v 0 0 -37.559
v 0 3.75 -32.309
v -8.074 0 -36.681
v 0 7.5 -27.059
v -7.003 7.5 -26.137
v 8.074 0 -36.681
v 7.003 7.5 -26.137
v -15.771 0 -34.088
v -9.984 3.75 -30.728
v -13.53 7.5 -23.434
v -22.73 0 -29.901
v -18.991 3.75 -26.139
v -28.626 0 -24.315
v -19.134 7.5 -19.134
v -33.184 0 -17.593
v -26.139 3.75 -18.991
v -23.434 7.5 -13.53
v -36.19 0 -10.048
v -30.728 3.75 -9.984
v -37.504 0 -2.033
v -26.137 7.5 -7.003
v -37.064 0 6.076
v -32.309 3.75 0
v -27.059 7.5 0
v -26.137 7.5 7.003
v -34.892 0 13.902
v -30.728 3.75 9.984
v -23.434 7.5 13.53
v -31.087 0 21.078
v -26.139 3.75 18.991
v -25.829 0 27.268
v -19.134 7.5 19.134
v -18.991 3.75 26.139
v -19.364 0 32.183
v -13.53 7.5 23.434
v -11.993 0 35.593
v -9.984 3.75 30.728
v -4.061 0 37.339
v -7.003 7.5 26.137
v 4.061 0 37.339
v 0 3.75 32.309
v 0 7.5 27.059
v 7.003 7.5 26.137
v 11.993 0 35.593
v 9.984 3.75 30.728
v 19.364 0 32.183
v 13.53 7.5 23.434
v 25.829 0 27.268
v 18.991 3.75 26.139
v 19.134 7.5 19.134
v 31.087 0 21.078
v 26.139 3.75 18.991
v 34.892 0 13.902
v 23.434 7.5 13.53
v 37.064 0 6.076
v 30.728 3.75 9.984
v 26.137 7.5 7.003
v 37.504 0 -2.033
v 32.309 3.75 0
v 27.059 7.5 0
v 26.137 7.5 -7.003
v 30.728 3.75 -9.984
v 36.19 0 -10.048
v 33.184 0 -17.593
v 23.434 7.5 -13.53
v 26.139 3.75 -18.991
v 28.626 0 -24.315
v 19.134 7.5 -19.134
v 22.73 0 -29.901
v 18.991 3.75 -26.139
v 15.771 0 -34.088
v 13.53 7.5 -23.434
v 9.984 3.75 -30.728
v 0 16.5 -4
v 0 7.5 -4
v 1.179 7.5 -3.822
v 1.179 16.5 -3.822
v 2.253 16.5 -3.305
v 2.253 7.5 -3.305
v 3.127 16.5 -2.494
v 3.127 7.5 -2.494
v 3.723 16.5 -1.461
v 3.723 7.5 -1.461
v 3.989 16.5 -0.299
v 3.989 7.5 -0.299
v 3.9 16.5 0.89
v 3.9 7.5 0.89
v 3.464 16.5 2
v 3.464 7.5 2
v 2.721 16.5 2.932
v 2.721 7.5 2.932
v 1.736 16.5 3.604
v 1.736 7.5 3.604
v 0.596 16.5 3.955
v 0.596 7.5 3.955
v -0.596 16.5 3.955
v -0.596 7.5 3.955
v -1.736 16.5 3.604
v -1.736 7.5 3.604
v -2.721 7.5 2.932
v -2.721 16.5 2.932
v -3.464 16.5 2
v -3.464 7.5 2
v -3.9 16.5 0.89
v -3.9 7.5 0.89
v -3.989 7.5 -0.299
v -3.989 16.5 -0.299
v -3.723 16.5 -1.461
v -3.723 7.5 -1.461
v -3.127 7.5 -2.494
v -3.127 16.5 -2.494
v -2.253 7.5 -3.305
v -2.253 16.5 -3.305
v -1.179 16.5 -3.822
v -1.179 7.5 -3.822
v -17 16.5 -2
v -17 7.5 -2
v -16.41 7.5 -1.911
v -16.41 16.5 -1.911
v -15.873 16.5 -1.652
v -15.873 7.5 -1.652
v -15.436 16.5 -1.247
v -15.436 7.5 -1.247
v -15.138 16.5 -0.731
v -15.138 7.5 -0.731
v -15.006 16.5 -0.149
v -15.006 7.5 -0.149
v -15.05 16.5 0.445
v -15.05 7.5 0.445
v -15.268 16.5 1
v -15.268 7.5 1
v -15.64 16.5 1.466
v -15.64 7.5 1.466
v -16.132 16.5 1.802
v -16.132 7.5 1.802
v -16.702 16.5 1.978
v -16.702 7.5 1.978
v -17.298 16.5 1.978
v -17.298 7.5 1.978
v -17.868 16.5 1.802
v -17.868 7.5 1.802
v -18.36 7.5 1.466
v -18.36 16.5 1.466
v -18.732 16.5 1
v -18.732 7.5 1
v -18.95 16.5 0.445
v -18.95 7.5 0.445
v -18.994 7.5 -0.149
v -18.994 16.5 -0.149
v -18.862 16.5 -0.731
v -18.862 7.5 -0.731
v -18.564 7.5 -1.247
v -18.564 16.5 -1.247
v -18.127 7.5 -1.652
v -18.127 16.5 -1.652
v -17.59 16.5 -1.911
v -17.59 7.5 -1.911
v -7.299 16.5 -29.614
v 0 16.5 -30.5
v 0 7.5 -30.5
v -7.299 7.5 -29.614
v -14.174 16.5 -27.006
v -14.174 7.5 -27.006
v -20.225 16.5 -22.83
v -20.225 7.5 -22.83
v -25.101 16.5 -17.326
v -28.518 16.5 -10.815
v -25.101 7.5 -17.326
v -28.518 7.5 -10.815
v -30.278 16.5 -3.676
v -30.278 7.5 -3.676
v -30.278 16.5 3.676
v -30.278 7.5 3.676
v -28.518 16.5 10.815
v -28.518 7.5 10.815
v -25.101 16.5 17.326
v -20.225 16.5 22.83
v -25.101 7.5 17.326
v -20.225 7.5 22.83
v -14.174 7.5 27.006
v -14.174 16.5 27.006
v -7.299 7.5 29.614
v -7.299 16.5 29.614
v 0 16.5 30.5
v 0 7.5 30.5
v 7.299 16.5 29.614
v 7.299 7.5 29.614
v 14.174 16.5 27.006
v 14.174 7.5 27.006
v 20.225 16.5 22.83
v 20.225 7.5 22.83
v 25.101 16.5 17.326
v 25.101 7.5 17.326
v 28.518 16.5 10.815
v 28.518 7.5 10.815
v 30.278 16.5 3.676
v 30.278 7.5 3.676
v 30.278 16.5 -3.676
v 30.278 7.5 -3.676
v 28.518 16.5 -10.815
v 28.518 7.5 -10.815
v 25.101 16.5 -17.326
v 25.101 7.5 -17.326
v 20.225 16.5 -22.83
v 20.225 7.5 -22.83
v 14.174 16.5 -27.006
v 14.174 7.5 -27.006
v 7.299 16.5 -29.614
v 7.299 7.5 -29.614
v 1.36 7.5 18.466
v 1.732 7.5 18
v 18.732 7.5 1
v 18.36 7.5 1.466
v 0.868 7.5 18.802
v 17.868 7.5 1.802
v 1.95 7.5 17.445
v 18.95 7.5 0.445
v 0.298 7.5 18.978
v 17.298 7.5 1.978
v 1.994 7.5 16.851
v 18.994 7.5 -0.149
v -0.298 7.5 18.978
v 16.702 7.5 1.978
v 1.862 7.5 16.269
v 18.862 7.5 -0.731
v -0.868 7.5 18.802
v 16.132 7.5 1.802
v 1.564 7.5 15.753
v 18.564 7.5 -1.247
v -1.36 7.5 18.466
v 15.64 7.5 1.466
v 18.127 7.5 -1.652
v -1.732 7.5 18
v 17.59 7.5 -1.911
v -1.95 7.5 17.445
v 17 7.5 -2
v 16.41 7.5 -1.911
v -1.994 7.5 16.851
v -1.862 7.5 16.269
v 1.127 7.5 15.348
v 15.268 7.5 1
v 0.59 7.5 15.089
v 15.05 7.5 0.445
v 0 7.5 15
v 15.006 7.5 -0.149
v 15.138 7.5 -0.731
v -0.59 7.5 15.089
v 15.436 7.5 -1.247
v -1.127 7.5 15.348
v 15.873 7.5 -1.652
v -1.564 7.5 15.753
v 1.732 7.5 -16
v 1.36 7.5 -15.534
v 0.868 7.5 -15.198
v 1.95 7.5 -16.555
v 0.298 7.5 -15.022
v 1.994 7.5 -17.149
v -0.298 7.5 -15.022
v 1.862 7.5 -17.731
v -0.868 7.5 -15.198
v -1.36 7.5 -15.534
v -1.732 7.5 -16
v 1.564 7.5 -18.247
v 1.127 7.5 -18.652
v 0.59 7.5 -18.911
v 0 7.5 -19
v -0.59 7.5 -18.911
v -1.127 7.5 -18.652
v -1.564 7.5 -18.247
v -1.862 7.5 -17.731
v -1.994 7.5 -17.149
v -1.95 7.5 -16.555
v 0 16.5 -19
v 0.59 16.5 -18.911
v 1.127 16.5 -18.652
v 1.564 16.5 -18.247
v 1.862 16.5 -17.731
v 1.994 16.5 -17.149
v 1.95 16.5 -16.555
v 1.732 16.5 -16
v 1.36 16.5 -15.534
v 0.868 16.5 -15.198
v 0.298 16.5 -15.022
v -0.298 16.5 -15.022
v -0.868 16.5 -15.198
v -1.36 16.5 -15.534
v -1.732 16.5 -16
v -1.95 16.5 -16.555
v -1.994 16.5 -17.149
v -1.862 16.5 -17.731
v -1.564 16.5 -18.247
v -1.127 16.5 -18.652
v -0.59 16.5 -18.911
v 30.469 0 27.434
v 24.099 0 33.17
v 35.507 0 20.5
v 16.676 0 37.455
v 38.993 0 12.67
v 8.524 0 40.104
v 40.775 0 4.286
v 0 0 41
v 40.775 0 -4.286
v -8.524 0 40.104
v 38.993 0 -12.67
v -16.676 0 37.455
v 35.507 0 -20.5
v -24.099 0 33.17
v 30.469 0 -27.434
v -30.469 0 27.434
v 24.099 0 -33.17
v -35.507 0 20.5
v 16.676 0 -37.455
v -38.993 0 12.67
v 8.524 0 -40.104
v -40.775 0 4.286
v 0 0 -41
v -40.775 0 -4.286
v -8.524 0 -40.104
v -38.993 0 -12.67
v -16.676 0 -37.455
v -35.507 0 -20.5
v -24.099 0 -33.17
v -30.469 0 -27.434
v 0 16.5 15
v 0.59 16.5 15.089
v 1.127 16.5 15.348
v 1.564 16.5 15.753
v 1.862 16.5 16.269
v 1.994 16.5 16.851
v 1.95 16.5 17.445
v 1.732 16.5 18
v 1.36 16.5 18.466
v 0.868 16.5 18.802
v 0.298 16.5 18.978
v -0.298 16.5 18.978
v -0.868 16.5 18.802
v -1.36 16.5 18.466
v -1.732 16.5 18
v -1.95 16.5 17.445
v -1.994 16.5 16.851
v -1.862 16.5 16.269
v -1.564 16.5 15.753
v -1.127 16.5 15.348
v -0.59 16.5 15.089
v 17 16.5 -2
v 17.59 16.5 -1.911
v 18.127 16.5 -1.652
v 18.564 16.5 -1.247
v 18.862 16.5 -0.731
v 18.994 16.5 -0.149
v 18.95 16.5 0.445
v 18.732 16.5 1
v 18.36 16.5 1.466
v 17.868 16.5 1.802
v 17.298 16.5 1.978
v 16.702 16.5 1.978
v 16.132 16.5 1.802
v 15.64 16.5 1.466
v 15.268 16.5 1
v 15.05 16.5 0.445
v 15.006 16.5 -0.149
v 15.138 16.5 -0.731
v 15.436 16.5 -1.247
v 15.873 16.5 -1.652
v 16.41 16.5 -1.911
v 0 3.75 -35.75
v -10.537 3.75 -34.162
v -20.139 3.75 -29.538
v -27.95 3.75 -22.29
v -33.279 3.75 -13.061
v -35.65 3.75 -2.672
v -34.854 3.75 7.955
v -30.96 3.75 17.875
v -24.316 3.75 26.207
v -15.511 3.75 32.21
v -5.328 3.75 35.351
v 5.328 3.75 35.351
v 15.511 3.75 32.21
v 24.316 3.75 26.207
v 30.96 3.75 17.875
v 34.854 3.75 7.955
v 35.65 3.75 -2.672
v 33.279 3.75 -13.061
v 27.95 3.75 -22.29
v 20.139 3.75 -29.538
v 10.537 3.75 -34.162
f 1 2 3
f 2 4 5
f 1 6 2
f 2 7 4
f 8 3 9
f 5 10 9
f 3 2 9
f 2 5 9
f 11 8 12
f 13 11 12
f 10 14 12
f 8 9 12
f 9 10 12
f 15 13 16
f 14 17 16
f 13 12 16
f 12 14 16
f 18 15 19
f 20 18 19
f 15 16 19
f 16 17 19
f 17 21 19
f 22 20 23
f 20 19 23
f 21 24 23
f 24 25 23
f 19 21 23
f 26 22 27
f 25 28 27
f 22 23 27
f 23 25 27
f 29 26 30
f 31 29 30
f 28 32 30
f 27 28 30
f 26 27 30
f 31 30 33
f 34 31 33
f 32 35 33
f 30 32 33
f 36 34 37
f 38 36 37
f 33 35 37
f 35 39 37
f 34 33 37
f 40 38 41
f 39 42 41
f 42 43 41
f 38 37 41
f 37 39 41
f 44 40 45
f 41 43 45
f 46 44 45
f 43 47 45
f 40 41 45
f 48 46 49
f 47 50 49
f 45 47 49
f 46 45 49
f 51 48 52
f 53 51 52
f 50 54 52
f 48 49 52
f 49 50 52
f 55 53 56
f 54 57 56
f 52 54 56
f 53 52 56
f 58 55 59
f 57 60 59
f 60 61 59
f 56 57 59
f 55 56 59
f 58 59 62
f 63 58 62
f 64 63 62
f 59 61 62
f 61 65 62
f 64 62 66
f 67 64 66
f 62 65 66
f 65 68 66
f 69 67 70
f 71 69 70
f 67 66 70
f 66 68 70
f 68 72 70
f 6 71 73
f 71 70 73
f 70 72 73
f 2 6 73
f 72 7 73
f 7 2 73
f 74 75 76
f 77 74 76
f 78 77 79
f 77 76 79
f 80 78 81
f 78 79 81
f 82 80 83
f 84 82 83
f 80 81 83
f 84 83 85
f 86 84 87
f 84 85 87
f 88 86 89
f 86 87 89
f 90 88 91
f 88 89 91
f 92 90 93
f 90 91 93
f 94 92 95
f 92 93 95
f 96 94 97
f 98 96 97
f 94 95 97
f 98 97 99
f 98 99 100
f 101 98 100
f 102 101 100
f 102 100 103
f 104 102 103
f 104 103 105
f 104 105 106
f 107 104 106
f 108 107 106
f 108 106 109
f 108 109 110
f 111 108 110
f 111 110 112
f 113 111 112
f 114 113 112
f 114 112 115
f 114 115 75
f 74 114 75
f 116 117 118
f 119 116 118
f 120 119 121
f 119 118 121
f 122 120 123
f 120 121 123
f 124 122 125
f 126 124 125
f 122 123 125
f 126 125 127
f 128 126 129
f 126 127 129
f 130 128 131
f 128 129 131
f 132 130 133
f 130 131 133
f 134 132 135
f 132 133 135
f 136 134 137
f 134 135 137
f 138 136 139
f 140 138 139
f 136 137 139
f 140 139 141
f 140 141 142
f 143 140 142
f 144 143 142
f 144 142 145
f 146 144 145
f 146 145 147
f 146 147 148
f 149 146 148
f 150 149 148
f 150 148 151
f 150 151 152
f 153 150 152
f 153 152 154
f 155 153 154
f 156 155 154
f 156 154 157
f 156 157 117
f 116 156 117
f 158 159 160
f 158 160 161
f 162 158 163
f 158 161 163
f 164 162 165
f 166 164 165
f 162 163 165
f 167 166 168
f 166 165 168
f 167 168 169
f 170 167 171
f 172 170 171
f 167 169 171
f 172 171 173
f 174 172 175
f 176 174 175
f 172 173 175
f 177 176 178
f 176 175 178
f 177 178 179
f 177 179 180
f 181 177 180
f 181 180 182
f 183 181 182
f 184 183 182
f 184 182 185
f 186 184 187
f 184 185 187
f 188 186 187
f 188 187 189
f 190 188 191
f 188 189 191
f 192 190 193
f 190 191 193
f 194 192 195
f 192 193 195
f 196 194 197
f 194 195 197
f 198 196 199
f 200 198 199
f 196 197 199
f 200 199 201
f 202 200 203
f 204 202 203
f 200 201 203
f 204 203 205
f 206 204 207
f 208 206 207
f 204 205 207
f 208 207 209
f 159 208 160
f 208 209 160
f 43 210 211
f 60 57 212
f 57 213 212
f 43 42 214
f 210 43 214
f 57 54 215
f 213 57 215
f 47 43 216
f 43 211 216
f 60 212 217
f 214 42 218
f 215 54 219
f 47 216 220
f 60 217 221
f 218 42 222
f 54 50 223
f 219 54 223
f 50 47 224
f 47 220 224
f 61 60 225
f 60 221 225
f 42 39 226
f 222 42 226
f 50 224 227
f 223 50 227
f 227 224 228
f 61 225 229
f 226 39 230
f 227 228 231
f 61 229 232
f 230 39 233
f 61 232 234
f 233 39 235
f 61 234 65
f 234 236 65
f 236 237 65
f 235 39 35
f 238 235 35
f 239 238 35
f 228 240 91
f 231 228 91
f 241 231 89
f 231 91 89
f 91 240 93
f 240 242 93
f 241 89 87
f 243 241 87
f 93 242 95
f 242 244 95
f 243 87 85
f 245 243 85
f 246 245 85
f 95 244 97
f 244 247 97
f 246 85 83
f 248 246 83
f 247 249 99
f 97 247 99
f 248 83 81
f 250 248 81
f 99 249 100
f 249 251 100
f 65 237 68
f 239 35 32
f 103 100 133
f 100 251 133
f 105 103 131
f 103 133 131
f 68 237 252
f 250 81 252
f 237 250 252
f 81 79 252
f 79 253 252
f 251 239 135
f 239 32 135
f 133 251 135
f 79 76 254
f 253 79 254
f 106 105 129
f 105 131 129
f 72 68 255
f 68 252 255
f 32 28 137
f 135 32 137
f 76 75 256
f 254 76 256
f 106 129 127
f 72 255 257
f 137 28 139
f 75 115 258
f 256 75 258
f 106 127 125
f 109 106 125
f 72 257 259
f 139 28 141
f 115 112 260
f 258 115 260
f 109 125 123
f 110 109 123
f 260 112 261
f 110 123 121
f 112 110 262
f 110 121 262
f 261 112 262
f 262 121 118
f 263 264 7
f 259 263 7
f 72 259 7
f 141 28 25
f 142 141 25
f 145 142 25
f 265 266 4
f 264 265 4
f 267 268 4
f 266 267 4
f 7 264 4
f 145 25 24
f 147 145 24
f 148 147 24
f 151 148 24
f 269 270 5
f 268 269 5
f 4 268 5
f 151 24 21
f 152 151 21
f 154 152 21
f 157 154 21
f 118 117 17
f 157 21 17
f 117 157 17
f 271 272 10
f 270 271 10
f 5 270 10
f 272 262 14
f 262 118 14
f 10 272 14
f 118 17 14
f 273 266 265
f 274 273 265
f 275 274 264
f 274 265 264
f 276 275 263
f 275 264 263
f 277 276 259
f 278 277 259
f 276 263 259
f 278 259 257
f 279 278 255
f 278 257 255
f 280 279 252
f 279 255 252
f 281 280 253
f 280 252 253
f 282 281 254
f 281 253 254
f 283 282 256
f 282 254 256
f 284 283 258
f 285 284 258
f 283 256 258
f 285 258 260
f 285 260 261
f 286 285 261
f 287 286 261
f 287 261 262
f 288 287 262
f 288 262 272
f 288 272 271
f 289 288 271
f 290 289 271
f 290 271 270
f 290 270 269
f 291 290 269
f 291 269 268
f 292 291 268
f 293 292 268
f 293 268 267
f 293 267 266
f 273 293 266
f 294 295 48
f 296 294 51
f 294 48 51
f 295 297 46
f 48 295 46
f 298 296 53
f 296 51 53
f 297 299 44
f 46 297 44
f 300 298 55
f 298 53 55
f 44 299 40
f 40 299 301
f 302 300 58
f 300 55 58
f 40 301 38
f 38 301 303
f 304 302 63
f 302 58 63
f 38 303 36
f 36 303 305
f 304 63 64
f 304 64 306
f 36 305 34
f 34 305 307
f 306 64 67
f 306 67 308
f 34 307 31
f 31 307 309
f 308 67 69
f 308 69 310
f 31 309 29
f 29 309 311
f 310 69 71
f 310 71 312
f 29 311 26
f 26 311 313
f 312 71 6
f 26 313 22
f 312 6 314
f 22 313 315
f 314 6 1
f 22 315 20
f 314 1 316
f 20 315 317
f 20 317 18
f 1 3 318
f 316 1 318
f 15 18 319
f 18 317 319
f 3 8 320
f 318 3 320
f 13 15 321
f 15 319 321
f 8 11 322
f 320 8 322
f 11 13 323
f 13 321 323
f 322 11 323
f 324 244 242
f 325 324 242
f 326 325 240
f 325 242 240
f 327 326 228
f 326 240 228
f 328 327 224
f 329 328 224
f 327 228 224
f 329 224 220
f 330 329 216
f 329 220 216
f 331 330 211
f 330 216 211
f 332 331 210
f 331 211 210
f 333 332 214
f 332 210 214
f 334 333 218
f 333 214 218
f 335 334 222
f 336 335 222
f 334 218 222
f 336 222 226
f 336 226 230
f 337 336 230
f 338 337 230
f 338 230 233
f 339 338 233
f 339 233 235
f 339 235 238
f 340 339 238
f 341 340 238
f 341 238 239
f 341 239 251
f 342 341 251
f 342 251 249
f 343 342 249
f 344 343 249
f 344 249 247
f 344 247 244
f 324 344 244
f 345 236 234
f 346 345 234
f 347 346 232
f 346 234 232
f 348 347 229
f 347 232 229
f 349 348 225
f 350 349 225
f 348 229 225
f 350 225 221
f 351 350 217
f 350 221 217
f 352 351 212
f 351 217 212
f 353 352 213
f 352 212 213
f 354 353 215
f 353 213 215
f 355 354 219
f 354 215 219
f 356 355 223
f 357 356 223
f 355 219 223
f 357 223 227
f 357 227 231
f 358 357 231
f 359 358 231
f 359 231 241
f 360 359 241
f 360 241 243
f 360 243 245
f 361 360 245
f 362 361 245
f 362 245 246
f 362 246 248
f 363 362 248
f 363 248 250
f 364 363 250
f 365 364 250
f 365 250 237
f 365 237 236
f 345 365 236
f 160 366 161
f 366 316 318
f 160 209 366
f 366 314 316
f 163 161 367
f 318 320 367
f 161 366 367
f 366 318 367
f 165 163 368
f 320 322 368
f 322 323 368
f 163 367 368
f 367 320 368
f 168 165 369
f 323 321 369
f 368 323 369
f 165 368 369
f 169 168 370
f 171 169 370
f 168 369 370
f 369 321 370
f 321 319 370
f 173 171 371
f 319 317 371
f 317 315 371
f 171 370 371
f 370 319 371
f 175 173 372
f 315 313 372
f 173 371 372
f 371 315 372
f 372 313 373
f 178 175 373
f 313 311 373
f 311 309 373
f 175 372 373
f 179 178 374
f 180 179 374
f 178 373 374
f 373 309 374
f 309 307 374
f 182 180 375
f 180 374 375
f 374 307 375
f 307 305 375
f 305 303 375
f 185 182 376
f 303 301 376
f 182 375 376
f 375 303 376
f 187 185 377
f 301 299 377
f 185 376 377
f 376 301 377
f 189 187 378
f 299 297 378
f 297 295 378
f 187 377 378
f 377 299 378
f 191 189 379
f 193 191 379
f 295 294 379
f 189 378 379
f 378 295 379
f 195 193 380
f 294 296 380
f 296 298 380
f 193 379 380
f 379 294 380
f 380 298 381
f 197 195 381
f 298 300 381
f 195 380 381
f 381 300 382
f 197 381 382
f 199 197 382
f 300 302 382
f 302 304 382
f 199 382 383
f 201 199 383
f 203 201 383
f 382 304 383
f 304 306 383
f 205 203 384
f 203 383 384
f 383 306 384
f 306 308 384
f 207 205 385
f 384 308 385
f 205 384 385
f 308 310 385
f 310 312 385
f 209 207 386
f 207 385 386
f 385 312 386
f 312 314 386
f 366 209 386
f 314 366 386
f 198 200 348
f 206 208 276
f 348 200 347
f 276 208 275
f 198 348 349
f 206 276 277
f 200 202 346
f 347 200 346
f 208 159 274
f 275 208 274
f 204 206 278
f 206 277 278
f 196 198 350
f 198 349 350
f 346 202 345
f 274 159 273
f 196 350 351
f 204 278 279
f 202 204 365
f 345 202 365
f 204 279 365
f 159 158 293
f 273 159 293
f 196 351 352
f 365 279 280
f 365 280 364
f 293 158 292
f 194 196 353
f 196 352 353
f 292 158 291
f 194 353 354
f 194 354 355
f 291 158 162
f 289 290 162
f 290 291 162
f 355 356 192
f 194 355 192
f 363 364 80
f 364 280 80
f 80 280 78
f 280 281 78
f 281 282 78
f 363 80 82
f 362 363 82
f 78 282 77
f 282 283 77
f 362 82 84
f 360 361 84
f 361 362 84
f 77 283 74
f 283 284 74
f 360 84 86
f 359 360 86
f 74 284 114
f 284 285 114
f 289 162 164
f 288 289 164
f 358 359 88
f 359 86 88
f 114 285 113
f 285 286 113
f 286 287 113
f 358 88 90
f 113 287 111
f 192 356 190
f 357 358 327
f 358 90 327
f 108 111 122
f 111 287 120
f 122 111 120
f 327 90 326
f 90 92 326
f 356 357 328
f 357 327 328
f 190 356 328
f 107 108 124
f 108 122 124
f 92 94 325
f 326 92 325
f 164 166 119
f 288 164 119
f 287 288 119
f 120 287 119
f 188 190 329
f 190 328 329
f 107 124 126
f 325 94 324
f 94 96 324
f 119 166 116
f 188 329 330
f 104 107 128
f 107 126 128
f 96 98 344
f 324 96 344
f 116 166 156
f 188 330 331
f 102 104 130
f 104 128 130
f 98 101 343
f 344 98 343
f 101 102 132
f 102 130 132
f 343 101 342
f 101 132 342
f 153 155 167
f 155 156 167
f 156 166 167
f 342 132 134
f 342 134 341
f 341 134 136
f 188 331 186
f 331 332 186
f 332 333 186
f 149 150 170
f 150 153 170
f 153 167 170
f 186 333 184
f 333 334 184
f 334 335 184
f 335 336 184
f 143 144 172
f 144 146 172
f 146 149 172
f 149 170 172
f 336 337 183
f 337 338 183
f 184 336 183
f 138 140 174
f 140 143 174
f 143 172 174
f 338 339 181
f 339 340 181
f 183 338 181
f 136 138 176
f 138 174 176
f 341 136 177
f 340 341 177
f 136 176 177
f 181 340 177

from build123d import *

# Parameters (mm, degrees)
SKETCH_2_R          = 4
SKETCH_2_R_2        = 2
CUT_EXTRUDE_1_DEPTH = 10


with BuildPart() as part:
    # 草图1 → 旋转1 (revolve)
    with BuildSketch(Plane.XY, mode=Mode.PRIVATE) as revolve_1_sk:
        Polygon((0, 16.5), (-30.5, 16.5), (-30.5, 7.5), (-41, 0), (-37.559069893, 0), (-27.059069893, 7.5), (0, 7.5), align=None)
    revolve(revolve_1_sk.sketch.rotate(Axis((0, 0, 0), (0, 1, 0)), 270), axis=Axis((0, 0, 0), (0, 1, 0)))

    # 草图2 → 切除-拉伸1 (cut)
    with BuildSketch(Plane.XZ.offset(-7.5)):
        with Locations(Location((0, 0, 0), (0, 0, 270))):
            Circle(SKETCH_2_R)
        with Locations(Location((0, 17, 0), (0, 0, 270))):
            Circle(SKETCH_2_R_2)
        with Locations(Location((17, 0, 0), (0, 0, 270))):
            Circle(SKETCH_2_R_2)
        with Locations(Location((0, -17, 0), (0, 0, 270))):
            Circle(SKETCH_2_R_2)
        with Locations(Location((-17, 0, 0), (0, 0, 270))):
            Circle(SKETCH_2_R_2)
    extrude(amount=-CUT_EXTRUDE_1_DEPTH, mode=Mode.SUBTRACT)


solid = part.part
